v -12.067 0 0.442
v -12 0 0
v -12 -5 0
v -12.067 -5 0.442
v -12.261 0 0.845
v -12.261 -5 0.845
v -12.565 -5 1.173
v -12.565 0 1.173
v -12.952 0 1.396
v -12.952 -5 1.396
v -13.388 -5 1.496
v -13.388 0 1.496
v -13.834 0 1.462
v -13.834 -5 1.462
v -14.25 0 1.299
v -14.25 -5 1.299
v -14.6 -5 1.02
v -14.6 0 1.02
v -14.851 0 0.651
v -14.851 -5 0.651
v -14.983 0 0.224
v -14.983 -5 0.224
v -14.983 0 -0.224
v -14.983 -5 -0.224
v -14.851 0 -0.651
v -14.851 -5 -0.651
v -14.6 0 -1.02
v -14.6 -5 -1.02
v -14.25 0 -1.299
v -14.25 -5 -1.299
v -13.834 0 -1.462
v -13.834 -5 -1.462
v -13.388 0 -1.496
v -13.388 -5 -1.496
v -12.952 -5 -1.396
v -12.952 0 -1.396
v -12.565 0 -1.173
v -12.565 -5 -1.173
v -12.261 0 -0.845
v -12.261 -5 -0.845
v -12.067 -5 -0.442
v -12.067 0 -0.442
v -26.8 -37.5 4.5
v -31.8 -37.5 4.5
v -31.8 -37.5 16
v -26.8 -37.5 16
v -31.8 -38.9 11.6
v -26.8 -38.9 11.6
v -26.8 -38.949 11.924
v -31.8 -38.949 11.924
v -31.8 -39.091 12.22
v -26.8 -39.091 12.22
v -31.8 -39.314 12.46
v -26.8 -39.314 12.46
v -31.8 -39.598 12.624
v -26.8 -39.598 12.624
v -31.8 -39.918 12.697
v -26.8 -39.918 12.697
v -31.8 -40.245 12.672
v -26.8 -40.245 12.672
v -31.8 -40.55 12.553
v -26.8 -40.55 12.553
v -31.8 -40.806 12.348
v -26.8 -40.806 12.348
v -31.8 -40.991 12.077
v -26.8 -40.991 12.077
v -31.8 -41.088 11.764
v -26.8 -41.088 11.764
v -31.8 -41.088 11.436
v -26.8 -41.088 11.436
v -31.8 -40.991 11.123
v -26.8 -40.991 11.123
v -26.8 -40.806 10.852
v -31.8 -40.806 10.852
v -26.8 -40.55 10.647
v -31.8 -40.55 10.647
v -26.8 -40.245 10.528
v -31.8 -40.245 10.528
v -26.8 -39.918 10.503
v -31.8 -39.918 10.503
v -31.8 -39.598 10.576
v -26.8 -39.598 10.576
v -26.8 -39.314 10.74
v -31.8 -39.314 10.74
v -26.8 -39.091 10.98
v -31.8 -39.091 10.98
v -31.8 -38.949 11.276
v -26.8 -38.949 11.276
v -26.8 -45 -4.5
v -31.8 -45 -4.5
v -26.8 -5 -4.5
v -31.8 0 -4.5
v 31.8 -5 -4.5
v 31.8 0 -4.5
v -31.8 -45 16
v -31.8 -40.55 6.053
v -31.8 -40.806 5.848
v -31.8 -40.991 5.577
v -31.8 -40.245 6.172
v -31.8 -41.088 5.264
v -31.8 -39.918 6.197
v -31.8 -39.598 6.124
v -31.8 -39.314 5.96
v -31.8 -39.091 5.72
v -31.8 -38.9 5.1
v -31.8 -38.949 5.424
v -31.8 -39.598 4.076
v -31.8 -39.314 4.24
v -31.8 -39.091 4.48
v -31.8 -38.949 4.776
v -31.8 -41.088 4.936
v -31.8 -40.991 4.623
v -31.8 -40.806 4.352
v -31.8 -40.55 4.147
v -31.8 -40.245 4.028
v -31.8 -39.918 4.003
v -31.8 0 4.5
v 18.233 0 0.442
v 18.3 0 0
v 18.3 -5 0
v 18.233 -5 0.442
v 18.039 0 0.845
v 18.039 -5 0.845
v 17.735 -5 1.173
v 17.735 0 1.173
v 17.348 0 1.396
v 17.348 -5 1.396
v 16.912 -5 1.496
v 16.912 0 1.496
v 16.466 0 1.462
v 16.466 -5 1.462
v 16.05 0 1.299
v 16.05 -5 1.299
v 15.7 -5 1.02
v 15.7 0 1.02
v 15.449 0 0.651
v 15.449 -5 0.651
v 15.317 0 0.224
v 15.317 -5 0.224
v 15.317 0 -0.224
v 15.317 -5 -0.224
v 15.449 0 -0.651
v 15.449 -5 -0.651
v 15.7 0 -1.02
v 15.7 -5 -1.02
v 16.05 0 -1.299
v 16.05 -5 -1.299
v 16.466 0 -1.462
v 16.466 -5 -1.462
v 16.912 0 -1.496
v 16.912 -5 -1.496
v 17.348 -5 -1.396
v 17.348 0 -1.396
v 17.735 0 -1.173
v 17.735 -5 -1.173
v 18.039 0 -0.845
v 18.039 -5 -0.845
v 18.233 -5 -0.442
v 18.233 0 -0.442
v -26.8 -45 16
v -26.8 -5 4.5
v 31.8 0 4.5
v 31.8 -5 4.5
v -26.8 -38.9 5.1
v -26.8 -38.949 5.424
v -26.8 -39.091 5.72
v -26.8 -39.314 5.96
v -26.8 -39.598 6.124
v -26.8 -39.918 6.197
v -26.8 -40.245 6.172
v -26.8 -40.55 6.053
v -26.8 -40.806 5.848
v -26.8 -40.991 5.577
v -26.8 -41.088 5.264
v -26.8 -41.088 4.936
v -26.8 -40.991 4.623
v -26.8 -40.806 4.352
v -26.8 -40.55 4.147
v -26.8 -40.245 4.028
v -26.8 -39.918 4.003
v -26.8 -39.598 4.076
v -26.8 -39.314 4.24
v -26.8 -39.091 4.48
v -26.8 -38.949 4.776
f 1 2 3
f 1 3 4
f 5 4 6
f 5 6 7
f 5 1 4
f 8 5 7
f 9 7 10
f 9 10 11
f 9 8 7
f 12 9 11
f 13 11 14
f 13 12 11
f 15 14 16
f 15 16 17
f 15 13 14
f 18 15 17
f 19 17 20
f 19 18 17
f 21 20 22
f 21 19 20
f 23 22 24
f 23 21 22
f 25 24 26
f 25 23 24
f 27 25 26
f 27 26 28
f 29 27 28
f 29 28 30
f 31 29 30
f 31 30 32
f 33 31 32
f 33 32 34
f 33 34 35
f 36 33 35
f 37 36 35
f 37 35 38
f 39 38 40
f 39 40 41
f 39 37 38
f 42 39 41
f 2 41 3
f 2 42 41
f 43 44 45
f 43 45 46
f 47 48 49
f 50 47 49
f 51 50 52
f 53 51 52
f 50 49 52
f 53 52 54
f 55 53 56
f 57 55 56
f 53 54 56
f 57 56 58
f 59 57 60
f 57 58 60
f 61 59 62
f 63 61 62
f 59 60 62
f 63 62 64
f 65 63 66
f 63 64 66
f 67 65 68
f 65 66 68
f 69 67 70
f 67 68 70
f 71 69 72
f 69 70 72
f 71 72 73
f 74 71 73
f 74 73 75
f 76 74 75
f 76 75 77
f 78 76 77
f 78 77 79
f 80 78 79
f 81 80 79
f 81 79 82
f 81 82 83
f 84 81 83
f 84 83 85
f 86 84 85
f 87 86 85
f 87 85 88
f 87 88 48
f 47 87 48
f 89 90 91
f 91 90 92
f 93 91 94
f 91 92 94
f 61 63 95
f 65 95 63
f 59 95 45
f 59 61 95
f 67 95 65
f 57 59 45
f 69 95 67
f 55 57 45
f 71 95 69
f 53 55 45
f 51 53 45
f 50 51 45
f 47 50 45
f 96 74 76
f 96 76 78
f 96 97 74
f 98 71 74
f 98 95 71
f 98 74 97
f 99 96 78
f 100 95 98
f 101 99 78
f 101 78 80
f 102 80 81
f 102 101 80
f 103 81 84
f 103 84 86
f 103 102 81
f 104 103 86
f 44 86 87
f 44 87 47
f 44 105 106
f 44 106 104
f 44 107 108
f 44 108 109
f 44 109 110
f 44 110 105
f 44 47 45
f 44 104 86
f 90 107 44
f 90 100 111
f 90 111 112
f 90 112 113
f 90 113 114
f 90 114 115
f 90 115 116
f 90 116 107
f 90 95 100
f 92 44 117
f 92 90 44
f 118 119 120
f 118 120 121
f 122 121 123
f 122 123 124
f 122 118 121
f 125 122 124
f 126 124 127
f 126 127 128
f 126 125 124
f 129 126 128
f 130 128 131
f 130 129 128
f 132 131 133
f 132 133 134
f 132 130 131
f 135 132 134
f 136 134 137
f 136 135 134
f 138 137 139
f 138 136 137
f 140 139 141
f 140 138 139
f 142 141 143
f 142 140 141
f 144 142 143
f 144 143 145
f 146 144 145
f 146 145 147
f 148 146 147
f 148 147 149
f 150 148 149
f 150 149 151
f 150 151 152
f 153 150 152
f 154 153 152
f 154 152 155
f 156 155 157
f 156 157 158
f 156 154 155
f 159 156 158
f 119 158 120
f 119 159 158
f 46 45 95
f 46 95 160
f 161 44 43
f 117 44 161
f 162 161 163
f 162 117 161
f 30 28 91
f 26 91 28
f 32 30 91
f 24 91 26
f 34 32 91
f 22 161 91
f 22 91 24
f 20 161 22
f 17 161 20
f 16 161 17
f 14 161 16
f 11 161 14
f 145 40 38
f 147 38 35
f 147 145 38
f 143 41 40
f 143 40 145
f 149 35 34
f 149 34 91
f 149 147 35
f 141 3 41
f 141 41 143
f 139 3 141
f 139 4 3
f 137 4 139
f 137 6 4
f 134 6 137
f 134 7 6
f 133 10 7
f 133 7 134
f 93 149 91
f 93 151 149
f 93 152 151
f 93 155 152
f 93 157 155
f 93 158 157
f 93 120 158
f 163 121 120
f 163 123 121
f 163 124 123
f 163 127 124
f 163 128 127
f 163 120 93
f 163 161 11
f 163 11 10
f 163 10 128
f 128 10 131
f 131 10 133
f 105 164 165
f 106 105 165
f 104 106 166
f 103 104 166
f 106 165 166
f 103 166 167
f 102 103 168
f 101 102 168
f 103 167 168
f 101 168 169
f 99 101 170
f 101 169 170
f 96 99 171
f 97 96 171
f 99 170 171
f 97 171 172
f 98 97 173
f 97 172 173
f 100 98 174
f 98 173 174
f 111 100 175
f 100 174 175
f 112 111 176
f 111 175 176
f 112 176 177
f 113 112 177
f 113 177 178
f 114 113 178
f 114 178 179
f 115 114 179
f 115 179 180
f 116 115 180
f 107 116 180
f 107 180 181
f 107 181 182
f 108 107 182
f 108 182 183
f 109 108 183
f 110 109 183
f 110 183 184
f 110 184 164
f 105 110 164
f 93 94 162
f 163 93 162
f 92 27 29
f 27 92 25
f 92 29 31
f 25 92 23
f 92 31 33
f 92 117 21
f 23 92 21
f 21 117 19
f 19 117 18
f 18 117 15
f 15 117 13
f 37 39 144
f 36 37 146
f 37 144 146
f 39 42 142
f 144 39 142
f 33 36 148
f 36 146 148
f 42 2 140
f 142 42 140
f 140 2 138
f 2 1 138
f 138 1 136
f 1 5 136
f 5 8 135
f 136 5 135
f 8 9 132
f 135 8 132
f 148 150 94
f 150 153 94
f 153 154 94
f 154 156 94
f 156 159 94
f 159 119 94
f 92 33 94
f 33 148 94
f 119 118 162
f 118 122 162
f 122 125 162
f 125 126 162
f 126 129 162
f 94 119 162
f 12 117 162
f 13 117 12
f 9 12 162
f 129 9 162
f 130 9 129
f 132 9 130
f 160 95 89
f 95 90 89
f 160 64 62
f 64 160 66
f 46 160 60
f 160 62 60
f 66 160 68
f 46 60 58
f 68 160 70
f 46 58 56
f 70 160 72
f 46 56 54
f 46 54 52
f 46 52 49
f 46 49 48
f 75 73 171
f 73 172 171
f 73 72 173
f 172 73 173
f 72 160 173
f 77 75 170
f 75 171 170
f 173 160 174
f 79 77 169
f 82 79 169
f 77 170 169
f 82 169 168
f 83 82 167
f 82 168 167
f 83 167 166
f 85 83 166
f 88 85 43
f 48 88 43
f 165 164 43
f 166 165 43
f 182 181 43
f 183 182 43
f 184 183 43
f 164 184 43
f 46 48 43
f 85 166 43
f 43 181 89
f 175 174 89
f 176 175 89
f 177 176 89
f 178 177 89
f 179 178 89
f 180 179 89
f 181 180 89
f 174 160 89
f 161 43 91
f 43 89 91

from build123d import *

# Parameters (mm, degrees)
F0_W     = 63.6
F0_H     = 9
F0_R     = 1.5
F1_DEPTH = 5
F2_W     = 5
F2_H     = 9
F3_DEPTH = 40
F4_W     = 5
F4_H     = 7.5
F5_DEPTH = 11.5
F6_R     = 1.1
F7_DEPTH = 5.001


with BuildPart() as f1:
    # F0 (on Front) → F1 (new body)
    with BuildSketch(Plane.XZ):
        Rectangle(F0_W, F0_H)
        with Locations((-13.5, 0)):
            Circle(F0_R, mode=Mode.SUBTRACT)
        with Locations((16.8, 0)):
            Circle(F0_R, mode=Mode.SUBTRACT)
    extrude(amount=F1_DEPTH)

    # F2 (on face) → F3 (join)
    with BuildSketch(Plane.XZ.offset(5)):
        with Locations((-29.3, 0)):
            Rectangle(F2_W, F2_H)
    extrude(amount=F3_DEPTH)

    # F4 (on face) → F5 (join)
    with BuildSketch(Plane.XY.offset(4.5)):
        with Locations((-29.3, -41.25)):
            Rectangle(F4_W, F4_H)
    extrude(amount=F5_DEPTH)

    # F6 (on face) → F7 (cut, through all)
    with BuildSketch(Plane.YZ.offset(-26.8)):
        with Locations((-40, 5.1)):
            Circle(F6_R)
        with Locations((-40, 11.6)):
            Circle(F6_R)
    extrude(amount=-F7_DEPTH, mode=Mode.SUBTRACT)


solid = f1.part
